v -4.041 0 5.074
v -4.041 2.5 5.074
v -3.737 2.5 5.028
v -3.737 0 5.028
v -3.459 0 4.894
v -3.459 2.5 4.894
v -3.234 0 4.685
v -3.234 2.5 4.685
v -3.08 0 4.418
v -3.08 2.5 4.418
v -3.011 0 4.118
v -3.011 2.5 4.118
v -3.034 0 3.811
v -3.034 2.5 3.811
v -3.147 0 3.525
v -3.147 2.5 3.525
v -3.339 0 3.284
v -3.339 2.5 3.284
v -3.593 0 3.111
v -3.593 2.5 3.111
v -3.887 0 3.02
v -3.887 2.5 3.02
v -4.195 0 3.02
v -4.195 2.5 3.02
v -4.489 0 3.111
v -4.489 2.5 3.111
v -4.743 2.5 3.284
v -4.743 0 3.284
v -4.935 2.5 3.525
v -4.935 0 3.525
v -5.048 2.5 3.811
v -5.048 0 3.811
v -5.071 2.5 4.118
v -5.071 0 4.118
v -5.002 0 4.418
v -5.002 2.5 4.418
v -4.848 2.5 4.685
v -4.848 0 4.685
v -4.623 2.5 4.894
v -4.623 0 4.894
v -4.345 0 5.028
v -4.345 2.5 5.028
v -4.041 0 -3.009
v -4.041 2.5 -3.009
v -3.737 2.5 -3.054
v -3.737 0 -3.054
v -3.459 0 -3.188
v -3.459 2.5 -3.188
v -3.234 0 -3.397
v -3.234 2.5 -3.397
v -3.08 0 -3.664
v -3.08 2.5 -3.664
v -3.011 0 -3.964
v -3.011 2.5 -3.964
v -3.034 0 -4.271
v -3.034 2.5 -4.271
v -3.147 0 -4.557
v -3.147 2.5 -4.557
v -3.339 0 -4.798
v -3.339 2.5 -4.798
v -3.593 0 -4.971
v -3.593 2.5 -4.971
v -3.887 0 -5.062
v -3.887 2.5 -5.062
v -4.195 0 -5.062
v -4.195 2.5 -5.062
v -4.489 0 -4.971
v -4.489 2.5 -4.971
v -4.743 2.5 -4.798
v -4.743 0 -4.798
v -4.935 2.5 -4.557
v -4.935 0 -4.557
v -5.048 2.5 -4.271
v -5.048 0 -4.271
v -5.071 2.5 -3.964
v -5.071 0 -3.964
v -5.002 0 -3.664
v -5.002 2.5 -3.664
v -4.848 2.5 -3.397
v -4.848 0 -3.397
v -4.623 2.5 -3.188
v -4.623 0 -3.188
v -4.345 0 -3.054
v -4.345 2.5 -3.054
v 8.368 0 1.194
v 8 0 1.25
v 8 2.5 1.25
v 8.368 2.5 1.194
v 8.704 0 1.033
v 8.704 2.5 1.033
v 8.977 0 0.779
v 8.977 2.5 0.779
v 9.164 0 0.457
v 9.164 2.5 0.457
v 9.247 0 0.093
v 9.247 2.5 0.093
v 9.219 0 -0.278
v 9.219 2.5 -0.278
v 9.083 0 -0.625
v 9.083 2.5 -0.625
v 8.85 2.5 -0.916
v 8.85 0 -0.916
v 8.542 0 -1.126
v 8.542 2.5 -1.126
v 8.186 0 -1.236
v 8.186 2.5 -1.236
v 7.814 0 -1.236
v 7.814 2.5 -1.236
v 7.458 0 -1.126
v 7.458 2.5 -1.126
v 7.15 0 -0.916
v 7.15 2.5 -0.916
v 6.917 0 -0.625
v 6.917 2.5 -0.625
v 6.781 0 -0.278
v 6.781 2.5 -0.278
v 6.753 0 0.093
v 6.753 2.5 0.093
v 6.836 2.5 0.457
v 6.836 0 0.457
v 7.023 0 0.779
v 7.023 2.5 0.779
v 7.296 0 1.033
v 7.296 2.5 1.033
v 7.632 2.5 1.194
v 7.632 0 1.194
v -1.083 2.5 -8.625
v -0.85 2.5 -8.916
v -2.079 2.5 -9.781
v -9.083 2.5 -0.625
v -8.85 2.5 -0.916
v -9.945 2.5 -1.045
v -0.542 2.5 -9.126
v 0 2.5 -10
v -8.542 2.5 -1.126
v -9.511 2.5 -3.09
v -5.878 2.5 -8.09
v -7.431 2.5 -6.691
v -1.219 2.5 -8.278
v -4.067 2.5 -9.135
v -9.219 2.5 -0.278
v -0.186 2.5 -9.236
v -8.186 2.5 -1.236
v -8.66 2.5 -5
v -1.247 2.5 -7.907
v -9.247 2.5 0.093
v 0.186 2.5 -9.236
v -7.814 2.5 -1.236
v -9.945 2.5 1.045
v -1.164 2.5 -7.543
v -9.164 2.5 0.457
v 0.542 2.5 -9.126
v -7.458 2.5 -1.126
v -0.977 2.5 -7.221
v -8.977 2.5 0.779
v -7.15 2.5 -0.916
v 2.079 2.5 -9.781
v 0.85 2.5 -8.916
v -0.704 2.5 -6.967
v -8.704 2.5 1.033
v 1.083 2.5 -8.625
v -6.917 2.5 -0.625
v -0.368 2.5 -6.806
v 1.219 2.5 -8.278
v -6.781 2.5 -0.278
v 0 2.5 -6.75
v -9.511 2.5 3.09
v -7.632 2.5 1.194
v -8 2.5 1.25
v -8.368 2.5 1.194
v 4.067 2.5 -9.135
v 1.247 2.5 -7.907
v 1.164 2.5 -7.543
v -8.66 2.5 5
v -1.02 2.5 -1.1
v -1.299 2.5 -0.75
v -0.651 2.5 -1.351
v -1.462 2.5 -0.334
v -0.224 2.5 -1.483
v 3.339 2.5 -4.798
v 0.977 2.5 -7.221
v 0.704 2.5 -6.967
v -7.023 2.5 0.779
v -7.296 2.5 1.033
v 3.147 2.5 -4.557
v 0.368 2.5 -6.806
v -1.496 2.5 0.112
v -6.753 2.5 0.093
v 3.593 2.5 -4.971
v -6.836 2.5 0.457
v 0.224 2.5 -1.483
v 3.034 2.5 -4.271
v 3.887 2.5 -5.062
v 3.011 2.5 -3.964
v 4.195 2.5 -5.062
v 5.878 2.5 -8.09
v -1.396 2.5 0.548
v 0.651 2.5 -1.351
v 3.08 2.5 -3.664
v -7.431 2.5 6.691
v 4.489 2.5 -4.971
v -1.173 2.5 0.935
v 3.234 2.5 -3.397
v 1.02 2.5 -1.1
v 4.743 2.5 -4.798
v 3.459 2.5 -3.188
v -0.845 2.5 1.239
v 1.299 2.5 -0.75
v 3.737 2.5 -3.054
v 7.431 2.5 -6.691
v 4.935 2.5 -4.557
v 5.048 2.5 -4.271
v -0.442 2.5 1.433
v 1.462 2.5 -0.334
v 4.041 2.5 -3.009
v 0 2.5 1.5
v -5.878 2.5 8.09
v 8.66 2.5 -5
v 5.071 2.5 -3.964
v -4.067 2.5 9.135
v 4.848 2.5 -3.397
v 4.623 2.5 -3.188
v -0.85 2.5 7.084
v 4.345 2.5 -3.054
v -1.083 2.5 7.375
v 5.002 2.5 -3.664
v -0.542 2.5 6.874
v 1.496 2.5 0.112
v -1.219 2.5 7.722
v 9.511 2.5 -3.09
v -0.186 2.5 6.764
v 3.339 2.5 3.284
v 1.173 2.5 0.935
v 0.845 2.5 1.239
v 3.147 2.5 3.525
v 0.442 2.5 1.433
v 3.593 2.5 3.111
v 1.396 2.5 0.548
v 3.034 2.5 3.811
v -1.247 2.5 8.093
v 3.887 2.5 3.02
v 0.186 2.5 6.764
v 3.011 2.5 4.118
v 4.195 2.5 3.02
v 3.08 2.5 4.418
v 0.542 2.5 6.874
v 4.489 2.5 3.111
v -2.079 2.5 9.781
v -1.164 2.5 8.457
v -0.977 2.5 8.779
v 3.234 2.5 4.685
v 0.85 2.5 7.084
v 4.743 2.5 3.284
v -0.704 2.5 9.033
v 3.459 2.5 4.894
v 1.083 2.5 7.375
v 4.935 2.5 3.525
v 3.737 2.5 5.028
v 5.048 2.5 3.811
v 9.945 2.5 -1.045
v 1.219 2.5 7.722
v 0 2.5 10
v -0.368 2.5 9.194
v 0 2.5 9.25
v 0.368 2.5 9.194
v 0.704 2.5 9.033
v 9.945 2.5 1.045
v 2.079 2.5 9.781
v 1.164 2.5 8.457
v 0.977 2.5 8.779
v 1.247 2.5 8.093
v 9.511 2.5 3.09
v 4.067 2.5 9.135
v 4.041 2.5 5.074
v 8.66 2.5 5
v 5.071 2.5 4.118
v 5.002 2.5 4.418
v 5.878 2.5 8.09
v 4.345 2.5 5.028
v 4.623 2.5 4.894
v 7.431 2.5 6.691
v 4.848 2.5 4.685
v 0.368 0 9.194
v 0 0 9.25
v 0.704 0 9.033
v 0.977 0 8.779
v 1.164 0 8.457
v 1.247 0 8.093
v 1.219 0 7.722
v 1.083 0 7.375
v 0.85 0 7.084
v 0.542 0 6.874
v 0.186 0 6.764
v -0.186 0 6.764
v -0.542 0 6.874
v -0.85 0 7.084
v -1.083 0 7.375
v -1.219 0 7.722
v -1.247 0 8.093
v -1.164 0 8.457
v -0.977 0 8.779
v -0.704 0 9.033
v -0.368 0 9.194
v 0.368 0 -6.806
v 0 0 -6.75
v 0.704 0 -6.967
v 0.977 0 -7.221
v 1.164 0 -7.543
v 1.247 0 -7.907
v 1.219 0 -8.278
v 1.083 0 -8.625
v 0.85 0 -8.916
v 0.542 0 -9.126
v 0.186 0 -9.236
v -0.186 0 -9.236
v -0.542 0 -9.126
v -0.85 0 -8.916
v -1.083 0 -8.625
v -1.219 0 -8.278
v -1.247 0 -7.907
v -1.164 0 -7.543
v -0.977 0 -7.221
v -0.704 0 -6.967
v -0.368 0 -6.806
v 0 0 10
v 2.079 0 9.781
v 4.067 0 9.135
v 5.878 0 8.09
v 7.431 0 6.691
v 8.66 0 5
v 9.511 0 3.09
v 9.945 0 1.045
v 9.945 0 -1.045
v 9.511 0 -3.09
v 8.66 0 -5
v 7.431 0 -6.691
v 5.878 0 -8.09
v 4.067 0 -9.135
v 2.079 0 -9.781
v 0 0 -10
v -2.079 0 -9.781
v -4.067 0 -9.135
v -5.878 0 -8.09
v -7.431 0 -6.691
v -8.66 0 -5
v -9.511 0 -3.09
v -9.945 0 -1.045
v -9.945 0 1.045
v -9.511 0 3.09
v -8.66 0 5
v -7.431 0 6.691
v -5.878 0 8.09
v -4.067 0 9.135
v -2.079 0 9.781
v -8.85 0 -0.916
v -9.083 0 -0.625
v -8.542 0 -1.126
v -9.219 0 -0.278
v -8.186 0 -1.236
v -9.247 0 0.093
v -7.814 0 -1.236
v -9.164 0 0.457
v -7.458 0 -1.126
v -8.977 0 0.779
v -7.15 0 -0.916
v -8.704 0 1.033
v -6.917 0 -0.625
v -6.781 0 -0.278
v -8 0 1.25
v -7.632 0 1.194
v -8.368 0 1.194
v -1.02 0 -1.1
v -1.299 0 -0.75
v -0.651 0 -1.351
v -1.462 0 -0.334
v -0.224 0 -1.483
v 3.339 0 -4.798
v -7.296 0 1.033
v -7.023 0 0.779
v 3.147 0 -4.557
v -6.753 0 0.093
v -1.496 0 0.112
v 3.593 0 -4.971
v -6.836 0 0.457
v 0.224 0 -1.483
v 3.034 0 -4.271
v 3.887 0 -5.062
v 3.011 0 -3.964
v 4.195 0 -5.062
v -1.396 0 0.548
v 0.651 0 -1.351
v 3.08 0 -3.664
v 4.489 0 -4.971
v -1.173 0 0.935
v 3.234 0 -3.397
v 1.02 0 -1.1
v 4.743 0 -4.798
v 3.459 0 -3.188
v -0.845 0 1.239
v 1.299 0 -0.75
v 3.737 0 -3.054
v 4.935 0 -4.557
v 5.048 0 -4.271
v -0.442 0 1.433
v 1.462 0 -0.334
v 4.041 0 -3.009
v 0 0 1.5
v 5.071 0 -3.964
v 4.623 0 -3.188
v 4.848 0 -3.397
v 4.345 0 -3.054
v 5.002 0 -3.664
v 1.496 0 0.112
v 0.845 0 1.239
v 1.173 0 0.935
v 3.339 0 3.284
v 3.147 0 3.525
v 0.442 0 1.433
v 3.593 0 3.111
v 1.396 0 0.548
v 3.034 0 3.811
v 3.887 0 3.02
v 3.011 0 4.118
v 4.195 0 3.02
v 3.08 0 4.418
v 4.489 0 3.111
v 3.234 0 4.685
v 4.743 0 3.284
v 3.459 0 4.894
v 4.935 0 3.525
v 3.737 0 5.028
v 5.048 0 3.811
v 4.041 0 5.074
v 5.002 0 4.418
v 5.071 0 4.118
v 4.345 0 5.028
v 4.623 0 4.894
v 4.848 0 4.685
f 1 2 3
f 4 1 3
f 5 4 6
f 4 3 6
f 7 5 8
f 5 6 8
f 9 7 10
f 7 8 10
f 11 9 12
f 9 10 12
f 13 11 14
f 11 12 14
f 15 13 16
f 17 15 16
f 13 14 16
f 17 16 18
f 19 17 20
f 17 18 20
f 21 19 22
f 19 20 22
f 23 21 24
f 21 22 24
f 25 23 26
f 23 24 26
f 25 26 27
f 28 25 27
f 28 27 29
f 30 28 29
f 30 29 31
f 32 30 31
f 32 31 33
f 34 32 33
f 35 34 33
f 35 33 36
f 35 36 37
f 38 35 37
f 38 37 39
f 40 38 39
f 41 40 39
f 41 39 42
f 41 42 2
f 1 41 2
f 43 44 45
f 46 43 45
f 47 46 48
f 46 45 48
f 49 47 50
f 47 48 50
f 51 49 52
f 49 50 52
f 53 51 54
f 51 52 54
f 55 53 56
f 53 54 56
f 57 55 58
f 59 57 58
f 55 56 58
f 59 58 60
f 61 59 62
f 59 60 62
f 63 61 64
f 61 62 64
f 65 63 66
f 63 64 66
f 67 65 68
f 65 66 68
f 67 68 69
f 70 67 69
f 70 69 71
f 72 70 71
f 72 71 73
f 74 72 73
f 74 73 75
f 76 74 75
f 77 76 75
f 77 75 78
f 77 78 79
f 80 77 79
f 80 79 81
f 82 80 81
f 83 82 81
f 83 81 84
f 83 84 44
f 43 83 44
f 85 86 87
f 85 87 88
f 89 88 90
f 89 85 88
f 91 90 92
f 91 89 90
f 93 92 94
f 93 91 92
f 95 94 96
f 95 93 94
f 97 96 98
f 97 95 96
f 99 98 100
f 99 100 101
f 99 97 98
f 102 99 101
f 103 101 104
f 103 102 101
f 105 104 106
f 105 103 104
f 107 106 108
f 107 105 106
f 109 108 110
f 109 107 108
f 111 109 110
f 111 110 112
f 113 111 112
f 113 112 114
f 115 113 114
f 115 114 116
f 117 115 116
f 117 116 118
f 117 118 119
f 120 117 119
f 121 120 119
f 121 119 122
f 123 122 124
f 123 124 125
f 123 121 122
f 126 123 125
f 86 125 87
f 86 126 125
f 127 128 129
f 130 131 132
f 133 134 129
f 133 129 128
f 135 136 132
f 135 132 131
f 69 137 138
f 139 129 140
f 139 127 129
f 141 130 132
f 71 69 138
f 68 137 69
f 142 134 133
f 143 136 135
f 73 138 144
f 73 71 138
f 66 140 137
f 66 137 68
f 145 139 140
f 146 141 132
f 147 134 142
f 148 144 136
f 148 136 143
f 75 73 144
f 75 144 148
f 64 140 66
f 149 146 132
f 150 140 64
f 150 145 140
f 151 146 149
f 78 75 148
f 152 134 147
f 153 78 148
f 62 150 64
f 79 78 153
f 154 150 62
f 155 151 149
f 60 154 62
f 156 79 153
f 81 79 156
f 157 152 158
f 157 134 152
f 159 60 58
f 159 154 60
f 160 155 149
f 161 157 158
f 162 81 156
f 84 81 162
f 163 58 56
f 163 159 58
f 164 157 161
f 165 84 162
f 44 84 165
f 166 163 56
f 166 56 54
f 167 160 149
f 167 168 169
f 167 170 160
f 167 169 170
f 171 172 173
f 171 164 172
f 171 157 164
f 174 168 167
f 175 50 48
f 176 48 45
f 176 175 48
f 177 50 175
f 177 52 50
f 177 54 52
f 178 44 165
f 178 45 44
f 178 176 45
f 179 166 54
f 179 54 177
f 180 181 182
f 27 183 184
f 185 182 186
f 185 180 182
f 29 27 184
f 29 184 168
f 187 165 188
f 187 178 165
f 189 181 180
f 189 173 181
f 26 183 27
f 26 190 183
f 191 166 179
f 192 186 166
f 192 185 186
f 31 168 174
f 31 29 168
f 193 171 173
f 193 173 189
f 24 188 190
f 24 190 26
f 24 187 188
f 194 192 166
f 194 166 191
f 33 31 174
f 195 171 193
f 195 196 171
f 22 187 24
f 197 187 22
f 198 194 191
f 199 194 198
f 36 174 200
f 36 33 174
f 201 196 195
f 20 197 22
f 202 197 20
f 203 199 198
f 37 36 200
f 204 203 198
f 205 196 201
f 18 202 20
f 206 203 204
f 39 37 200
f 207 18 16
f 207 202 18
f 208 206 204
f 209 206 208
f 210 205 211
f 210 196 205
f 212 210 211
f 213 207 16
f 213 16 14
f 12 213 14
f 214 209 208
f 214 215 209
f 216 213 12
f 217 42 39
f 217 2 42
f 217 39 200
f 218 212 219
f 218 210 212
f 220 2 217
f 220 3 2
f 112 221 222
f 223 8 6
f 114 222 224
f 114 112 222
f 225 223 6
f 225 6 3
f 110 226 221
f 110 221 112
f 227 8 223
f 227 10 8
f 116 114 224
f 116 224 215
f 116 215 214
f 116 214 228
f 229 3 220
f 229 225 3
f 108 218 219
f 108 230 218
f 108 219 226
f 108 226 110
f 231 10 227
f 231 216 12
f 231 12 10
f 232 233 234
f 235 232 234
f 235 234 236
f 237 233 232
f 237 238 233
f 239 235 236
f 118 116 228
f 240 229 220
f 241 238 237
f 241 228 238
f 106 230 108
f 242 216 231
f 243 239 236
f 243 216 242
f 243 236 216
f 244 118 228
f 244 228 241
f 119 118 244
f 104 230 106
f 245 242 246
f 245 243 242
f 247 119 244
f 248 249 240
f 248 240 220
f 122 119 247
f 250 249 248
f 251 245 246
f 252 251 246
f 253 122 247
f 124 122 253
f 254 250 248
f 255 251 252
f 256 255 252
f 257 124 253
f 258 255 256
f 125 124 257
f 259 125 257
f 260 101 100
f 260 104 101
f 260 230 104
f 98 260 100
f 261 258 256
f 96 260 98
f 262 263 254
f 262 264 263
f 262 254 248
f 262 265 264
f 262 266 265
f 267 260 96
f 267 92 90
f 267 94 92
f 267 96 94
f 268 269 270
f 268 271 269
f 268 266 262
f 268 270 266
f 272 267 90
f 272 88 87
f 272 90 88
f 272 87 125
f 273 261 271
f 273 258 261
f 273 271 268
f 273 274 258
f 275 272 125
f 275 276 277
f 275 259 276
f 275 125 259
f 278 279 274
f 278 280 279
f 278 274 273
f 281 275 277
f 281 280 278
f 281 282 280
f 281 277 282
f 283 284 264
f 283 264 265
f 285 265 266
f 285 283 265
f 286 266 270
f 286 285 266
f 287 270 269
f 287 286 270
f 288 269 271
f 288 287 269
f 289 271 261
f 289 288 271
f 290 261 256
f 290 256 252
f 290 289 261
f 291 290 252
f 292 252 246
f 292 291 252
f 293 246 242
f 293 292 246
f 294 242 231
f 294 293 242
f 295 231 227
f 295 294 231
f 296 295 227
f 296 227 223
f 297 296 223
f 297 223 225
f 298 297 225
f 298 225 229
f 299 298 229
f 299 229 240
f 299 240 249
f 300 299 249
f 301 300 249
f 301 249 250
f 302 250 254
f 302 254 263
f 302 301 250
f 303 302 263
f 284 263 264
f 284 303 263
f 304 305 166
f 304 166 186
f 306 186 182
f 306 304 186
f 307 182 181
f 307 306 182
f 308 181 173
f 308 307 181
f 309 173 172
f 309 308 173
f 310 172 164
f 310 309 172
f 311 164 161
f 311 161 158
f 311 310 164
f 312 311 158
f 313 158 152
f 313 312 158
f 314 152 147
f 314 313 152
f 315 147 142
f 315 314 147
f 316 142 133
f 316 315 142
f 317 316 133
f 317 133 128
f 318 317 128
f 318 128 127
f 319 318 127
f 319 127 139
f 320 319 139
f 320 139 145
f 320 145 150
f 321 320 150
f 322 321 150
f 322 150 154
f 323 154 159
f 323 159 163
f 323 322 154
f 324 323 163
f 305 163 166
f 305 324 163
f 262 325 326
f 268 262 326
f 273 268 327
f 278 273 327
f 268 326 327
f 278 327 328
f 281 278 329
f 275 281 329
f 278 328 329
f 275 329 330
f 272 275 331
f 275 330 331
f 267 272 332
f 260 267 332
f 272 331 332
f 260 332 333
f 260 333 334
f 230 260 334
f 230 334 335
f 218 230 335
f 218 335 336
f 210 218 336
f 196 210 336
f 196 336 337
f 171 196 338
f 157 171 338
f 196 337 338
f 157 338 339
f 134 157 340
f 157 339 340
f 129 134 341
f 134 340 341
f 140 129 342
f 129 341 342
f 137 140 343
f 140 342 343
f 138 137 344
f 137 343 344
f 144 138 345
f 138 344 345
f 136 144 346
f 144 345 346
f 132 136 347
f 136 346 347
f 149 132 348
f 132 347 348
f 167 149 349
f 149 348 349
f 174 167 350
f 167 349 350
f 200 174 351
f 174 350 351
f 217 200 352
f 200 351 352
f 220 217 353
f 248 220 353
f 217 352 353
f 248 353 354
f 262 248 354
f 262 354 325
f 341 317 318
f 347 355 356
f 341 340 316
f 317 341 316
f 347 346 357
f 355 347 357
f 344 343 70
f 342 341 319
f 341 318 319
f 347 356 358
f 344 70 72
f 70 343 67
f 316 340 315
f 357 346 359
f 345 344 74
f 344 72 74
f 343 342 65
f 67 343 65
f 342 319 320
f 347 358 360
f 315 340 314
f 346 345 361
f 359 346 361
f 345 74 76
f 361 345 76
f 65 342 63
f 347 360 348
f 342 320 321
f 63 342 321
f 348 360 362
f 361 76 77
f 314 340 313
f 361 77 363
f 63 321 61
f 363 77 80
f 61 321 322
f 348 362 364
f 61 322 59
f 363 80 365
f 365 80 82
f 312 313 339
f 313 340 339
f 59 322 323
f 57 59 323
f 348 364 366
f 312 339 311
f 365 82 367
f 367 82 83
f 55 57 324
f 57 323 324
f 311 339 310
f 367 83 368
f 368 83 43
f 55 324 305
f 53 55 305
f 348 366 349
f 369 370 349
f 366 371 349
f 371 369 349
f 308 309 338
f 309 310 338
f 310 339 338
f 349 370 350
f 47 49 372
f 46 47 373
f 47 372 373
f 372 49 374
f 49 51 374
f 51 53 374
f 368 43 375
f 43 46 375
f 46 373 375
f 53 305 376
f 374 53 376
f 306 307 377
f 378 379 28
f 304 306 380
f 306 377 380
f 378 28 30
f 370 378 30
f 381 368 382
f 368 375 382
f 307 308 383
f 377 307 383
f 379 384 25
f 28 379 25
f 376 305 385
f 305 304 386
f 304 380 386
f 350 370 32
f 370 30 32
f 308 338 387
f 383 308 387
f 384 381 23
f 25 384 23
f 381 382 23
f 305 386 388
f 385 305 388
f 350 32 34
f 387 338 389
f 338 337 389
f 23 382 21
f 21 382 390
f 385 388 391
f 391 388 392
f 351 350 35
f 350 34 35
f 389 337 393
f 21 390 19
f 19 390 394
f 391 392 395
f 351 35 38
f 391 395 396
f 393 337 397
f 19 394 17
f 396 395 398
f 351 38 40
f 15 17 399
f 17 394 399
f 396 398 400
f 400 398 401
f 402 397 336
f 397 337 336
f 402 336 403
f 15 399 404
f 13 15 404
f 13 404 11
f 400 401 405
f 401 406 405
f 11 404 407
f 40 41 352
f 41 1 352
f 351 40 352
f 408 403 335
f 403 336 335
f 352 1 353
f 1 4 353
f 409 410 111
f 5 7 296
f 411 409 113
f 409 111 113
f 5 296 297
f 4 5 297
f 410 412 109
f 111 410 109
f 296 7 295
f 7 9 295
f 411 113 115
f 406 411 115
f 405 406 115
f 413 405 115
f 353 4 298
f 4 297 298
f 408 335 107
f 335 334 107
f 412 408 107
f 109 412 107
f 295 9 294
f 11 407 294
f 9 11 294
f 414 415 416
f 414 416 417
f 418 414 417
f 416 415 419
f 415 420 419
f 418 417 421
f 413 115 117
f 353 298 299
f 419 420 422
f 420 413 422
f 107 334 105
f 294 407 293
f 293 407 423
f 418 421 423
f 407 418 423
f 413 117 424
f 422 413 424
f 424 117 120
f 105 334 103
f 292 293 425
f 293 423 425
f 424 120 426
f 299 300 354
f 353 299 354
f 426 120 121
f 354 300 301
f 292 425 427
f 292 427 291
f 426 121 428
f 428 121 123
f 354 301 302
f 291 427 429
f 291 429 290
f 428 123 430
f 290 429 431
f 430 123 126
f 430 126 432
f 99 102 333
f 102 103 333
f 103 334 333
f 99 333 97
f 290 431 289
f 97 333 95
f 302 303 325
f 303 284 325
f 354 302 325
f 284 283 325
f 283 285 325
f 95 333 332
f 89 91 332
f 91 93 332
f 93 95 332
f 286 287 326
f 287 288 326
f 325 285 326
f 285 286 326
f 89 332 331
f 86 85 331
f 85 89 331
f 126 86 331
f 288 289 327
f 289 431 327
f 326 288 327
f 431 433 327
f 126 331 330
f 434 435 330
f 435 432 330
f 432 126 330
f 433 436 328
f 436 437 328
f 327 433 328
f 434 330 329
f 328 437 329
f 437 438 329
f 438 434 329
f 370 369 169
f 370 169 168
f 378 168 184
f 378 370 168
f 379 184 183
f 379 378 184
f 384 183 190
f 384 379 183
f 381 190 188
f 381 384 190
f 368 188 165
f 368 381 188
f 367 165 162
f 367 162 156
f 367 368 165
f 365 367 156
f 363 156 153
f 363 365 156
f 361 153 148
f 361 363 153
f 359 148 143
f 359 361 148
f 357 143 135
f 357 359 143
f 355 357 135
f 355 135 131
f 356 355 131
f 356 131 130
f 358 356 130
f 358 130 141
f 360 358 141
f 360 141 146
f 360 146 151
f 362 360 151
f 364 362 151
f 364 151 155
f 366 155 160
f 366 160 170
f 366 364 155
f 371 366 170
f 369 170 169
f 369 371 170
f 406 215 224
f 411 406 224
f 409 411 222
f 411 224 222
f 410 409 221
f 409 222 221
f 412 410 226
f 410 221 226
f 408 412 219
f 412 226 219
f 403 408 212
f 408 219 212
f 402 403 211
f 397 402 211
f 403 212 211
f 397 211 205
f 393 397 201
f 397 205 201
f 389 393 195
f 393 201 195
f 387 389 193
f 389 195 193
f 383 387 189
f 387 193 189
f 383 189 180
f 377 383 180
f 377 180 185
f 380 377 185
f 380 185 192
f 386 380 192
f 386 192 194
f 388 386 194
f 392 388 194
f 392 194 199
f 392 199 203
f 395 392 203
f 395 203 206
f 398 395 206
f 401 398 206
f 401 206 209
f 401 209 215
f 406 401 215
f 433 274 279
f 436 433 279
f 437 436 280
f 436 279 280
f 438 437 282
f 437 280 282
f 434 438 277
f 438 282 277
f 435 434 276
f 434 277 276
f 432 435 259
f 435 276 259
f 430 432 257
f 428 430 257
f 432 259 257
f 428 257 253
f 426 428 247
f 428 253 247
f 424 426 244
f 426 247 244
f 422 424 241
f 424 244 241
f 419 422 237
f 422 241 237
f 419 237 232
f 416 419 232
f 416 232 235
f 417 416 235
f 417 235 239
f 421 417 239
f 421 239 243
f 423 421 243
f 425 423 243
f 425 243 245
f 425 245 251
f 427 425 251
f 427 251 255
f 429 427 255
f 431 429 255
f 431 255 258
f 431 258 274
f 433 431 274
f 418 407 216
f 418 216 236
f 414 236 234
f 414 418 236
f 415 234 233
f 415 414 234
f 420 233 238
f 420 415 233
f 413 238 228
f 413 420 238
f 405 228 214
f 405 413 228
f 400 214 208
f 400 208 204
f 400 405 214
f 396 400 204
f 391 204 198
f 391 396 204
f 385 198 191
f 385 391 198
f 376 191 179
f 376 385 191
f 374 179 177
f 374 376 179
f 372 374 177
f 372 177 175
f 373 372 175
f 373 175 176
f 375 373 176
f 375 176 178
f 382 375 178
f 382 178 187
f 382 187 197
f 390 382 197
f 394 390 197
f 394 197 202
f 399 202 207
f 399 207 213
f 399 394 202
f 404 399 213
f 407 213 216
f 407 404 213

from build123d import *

# Parameters (mm, degrees)
SKETCH1_R           = 10
SKETCH1_R_2         = 1.25
SKETCH1_R_3         = 1.5
BOSS_EXTRUDE1_DEPTH = 2.5
SKETCH2_R           = 1.03251
CUT_EXTRUDE1_DEPTH  = 15.361406616


with BuildPart() as part:
    # Sketch1 → Boss-Extrude1 (new body)
    with BuildSketch(Plane(origin=(0, 0, 0), x_dir=(1, 0, 0), z_dir=(0, 1, 0))):
        with Locations(Location((0, 0, 0), (0, 0, 270))):
            Circle(SKETCH1_R)
        with Locations(Location((-8, 0, 0), (0, 0, 270))):
            Circle(SKETCH1_R_2, mode=Mode.SUBTRACT)
        with Locations(Location((0, -8, 0), (0, 0, 270))):
            Circle(SKETCH1_R_2, mode=Mode.SUBTRACT)
        with Locations(Location((8, 0, 0), (0, 0, 270))):
            Circle(SKETCH1_R_2, mode=Mode.SUBTRACT)
        with Locations(Location((0, 8, 0), (0, 0, 270))):
            Circle(SKETCH1_R_2, mode=Mode.SUBTRACT)
        with Locations(Location((0, 0, 0), (0, 0, 270))):
            Circle(SKETCH1_R_3, mode=Mode.SUBTRACT)
    extrude(amount=BOSS_EXTRUDE1_DEPTH)

    # Sketch2 → Cut-Extrude1 (cut, through all)
    with BuildSketch(Plane(origin=(0, 2.5, 0), x_dir=(1, 0, 0), z_dir=(0, 1, 0))):
        with Locations(Location((-4.041115254, 4.041115254, 0), (0, 0, 270))):
            Circle(SKETCH2_R)
        with Locations(Location((4.041115254, 4.041115254, 0), (0, 0, 270))):
            Circle(SKETCH2_R)
        with Locations(Location((4.041115254, -4.041115254, 0), (0, 0, 270))):
            Circle(SKETCH2_R)
        with Locations(Location((-4.041115254, -4.041115254, 0), (0, 0, 270))):
            Circle(SKETCH2_R)
    extrude(amount=-CUT_EXTRUDE1_DEPTH, mode=Mode.SUBTRACT)


solid = part.part
